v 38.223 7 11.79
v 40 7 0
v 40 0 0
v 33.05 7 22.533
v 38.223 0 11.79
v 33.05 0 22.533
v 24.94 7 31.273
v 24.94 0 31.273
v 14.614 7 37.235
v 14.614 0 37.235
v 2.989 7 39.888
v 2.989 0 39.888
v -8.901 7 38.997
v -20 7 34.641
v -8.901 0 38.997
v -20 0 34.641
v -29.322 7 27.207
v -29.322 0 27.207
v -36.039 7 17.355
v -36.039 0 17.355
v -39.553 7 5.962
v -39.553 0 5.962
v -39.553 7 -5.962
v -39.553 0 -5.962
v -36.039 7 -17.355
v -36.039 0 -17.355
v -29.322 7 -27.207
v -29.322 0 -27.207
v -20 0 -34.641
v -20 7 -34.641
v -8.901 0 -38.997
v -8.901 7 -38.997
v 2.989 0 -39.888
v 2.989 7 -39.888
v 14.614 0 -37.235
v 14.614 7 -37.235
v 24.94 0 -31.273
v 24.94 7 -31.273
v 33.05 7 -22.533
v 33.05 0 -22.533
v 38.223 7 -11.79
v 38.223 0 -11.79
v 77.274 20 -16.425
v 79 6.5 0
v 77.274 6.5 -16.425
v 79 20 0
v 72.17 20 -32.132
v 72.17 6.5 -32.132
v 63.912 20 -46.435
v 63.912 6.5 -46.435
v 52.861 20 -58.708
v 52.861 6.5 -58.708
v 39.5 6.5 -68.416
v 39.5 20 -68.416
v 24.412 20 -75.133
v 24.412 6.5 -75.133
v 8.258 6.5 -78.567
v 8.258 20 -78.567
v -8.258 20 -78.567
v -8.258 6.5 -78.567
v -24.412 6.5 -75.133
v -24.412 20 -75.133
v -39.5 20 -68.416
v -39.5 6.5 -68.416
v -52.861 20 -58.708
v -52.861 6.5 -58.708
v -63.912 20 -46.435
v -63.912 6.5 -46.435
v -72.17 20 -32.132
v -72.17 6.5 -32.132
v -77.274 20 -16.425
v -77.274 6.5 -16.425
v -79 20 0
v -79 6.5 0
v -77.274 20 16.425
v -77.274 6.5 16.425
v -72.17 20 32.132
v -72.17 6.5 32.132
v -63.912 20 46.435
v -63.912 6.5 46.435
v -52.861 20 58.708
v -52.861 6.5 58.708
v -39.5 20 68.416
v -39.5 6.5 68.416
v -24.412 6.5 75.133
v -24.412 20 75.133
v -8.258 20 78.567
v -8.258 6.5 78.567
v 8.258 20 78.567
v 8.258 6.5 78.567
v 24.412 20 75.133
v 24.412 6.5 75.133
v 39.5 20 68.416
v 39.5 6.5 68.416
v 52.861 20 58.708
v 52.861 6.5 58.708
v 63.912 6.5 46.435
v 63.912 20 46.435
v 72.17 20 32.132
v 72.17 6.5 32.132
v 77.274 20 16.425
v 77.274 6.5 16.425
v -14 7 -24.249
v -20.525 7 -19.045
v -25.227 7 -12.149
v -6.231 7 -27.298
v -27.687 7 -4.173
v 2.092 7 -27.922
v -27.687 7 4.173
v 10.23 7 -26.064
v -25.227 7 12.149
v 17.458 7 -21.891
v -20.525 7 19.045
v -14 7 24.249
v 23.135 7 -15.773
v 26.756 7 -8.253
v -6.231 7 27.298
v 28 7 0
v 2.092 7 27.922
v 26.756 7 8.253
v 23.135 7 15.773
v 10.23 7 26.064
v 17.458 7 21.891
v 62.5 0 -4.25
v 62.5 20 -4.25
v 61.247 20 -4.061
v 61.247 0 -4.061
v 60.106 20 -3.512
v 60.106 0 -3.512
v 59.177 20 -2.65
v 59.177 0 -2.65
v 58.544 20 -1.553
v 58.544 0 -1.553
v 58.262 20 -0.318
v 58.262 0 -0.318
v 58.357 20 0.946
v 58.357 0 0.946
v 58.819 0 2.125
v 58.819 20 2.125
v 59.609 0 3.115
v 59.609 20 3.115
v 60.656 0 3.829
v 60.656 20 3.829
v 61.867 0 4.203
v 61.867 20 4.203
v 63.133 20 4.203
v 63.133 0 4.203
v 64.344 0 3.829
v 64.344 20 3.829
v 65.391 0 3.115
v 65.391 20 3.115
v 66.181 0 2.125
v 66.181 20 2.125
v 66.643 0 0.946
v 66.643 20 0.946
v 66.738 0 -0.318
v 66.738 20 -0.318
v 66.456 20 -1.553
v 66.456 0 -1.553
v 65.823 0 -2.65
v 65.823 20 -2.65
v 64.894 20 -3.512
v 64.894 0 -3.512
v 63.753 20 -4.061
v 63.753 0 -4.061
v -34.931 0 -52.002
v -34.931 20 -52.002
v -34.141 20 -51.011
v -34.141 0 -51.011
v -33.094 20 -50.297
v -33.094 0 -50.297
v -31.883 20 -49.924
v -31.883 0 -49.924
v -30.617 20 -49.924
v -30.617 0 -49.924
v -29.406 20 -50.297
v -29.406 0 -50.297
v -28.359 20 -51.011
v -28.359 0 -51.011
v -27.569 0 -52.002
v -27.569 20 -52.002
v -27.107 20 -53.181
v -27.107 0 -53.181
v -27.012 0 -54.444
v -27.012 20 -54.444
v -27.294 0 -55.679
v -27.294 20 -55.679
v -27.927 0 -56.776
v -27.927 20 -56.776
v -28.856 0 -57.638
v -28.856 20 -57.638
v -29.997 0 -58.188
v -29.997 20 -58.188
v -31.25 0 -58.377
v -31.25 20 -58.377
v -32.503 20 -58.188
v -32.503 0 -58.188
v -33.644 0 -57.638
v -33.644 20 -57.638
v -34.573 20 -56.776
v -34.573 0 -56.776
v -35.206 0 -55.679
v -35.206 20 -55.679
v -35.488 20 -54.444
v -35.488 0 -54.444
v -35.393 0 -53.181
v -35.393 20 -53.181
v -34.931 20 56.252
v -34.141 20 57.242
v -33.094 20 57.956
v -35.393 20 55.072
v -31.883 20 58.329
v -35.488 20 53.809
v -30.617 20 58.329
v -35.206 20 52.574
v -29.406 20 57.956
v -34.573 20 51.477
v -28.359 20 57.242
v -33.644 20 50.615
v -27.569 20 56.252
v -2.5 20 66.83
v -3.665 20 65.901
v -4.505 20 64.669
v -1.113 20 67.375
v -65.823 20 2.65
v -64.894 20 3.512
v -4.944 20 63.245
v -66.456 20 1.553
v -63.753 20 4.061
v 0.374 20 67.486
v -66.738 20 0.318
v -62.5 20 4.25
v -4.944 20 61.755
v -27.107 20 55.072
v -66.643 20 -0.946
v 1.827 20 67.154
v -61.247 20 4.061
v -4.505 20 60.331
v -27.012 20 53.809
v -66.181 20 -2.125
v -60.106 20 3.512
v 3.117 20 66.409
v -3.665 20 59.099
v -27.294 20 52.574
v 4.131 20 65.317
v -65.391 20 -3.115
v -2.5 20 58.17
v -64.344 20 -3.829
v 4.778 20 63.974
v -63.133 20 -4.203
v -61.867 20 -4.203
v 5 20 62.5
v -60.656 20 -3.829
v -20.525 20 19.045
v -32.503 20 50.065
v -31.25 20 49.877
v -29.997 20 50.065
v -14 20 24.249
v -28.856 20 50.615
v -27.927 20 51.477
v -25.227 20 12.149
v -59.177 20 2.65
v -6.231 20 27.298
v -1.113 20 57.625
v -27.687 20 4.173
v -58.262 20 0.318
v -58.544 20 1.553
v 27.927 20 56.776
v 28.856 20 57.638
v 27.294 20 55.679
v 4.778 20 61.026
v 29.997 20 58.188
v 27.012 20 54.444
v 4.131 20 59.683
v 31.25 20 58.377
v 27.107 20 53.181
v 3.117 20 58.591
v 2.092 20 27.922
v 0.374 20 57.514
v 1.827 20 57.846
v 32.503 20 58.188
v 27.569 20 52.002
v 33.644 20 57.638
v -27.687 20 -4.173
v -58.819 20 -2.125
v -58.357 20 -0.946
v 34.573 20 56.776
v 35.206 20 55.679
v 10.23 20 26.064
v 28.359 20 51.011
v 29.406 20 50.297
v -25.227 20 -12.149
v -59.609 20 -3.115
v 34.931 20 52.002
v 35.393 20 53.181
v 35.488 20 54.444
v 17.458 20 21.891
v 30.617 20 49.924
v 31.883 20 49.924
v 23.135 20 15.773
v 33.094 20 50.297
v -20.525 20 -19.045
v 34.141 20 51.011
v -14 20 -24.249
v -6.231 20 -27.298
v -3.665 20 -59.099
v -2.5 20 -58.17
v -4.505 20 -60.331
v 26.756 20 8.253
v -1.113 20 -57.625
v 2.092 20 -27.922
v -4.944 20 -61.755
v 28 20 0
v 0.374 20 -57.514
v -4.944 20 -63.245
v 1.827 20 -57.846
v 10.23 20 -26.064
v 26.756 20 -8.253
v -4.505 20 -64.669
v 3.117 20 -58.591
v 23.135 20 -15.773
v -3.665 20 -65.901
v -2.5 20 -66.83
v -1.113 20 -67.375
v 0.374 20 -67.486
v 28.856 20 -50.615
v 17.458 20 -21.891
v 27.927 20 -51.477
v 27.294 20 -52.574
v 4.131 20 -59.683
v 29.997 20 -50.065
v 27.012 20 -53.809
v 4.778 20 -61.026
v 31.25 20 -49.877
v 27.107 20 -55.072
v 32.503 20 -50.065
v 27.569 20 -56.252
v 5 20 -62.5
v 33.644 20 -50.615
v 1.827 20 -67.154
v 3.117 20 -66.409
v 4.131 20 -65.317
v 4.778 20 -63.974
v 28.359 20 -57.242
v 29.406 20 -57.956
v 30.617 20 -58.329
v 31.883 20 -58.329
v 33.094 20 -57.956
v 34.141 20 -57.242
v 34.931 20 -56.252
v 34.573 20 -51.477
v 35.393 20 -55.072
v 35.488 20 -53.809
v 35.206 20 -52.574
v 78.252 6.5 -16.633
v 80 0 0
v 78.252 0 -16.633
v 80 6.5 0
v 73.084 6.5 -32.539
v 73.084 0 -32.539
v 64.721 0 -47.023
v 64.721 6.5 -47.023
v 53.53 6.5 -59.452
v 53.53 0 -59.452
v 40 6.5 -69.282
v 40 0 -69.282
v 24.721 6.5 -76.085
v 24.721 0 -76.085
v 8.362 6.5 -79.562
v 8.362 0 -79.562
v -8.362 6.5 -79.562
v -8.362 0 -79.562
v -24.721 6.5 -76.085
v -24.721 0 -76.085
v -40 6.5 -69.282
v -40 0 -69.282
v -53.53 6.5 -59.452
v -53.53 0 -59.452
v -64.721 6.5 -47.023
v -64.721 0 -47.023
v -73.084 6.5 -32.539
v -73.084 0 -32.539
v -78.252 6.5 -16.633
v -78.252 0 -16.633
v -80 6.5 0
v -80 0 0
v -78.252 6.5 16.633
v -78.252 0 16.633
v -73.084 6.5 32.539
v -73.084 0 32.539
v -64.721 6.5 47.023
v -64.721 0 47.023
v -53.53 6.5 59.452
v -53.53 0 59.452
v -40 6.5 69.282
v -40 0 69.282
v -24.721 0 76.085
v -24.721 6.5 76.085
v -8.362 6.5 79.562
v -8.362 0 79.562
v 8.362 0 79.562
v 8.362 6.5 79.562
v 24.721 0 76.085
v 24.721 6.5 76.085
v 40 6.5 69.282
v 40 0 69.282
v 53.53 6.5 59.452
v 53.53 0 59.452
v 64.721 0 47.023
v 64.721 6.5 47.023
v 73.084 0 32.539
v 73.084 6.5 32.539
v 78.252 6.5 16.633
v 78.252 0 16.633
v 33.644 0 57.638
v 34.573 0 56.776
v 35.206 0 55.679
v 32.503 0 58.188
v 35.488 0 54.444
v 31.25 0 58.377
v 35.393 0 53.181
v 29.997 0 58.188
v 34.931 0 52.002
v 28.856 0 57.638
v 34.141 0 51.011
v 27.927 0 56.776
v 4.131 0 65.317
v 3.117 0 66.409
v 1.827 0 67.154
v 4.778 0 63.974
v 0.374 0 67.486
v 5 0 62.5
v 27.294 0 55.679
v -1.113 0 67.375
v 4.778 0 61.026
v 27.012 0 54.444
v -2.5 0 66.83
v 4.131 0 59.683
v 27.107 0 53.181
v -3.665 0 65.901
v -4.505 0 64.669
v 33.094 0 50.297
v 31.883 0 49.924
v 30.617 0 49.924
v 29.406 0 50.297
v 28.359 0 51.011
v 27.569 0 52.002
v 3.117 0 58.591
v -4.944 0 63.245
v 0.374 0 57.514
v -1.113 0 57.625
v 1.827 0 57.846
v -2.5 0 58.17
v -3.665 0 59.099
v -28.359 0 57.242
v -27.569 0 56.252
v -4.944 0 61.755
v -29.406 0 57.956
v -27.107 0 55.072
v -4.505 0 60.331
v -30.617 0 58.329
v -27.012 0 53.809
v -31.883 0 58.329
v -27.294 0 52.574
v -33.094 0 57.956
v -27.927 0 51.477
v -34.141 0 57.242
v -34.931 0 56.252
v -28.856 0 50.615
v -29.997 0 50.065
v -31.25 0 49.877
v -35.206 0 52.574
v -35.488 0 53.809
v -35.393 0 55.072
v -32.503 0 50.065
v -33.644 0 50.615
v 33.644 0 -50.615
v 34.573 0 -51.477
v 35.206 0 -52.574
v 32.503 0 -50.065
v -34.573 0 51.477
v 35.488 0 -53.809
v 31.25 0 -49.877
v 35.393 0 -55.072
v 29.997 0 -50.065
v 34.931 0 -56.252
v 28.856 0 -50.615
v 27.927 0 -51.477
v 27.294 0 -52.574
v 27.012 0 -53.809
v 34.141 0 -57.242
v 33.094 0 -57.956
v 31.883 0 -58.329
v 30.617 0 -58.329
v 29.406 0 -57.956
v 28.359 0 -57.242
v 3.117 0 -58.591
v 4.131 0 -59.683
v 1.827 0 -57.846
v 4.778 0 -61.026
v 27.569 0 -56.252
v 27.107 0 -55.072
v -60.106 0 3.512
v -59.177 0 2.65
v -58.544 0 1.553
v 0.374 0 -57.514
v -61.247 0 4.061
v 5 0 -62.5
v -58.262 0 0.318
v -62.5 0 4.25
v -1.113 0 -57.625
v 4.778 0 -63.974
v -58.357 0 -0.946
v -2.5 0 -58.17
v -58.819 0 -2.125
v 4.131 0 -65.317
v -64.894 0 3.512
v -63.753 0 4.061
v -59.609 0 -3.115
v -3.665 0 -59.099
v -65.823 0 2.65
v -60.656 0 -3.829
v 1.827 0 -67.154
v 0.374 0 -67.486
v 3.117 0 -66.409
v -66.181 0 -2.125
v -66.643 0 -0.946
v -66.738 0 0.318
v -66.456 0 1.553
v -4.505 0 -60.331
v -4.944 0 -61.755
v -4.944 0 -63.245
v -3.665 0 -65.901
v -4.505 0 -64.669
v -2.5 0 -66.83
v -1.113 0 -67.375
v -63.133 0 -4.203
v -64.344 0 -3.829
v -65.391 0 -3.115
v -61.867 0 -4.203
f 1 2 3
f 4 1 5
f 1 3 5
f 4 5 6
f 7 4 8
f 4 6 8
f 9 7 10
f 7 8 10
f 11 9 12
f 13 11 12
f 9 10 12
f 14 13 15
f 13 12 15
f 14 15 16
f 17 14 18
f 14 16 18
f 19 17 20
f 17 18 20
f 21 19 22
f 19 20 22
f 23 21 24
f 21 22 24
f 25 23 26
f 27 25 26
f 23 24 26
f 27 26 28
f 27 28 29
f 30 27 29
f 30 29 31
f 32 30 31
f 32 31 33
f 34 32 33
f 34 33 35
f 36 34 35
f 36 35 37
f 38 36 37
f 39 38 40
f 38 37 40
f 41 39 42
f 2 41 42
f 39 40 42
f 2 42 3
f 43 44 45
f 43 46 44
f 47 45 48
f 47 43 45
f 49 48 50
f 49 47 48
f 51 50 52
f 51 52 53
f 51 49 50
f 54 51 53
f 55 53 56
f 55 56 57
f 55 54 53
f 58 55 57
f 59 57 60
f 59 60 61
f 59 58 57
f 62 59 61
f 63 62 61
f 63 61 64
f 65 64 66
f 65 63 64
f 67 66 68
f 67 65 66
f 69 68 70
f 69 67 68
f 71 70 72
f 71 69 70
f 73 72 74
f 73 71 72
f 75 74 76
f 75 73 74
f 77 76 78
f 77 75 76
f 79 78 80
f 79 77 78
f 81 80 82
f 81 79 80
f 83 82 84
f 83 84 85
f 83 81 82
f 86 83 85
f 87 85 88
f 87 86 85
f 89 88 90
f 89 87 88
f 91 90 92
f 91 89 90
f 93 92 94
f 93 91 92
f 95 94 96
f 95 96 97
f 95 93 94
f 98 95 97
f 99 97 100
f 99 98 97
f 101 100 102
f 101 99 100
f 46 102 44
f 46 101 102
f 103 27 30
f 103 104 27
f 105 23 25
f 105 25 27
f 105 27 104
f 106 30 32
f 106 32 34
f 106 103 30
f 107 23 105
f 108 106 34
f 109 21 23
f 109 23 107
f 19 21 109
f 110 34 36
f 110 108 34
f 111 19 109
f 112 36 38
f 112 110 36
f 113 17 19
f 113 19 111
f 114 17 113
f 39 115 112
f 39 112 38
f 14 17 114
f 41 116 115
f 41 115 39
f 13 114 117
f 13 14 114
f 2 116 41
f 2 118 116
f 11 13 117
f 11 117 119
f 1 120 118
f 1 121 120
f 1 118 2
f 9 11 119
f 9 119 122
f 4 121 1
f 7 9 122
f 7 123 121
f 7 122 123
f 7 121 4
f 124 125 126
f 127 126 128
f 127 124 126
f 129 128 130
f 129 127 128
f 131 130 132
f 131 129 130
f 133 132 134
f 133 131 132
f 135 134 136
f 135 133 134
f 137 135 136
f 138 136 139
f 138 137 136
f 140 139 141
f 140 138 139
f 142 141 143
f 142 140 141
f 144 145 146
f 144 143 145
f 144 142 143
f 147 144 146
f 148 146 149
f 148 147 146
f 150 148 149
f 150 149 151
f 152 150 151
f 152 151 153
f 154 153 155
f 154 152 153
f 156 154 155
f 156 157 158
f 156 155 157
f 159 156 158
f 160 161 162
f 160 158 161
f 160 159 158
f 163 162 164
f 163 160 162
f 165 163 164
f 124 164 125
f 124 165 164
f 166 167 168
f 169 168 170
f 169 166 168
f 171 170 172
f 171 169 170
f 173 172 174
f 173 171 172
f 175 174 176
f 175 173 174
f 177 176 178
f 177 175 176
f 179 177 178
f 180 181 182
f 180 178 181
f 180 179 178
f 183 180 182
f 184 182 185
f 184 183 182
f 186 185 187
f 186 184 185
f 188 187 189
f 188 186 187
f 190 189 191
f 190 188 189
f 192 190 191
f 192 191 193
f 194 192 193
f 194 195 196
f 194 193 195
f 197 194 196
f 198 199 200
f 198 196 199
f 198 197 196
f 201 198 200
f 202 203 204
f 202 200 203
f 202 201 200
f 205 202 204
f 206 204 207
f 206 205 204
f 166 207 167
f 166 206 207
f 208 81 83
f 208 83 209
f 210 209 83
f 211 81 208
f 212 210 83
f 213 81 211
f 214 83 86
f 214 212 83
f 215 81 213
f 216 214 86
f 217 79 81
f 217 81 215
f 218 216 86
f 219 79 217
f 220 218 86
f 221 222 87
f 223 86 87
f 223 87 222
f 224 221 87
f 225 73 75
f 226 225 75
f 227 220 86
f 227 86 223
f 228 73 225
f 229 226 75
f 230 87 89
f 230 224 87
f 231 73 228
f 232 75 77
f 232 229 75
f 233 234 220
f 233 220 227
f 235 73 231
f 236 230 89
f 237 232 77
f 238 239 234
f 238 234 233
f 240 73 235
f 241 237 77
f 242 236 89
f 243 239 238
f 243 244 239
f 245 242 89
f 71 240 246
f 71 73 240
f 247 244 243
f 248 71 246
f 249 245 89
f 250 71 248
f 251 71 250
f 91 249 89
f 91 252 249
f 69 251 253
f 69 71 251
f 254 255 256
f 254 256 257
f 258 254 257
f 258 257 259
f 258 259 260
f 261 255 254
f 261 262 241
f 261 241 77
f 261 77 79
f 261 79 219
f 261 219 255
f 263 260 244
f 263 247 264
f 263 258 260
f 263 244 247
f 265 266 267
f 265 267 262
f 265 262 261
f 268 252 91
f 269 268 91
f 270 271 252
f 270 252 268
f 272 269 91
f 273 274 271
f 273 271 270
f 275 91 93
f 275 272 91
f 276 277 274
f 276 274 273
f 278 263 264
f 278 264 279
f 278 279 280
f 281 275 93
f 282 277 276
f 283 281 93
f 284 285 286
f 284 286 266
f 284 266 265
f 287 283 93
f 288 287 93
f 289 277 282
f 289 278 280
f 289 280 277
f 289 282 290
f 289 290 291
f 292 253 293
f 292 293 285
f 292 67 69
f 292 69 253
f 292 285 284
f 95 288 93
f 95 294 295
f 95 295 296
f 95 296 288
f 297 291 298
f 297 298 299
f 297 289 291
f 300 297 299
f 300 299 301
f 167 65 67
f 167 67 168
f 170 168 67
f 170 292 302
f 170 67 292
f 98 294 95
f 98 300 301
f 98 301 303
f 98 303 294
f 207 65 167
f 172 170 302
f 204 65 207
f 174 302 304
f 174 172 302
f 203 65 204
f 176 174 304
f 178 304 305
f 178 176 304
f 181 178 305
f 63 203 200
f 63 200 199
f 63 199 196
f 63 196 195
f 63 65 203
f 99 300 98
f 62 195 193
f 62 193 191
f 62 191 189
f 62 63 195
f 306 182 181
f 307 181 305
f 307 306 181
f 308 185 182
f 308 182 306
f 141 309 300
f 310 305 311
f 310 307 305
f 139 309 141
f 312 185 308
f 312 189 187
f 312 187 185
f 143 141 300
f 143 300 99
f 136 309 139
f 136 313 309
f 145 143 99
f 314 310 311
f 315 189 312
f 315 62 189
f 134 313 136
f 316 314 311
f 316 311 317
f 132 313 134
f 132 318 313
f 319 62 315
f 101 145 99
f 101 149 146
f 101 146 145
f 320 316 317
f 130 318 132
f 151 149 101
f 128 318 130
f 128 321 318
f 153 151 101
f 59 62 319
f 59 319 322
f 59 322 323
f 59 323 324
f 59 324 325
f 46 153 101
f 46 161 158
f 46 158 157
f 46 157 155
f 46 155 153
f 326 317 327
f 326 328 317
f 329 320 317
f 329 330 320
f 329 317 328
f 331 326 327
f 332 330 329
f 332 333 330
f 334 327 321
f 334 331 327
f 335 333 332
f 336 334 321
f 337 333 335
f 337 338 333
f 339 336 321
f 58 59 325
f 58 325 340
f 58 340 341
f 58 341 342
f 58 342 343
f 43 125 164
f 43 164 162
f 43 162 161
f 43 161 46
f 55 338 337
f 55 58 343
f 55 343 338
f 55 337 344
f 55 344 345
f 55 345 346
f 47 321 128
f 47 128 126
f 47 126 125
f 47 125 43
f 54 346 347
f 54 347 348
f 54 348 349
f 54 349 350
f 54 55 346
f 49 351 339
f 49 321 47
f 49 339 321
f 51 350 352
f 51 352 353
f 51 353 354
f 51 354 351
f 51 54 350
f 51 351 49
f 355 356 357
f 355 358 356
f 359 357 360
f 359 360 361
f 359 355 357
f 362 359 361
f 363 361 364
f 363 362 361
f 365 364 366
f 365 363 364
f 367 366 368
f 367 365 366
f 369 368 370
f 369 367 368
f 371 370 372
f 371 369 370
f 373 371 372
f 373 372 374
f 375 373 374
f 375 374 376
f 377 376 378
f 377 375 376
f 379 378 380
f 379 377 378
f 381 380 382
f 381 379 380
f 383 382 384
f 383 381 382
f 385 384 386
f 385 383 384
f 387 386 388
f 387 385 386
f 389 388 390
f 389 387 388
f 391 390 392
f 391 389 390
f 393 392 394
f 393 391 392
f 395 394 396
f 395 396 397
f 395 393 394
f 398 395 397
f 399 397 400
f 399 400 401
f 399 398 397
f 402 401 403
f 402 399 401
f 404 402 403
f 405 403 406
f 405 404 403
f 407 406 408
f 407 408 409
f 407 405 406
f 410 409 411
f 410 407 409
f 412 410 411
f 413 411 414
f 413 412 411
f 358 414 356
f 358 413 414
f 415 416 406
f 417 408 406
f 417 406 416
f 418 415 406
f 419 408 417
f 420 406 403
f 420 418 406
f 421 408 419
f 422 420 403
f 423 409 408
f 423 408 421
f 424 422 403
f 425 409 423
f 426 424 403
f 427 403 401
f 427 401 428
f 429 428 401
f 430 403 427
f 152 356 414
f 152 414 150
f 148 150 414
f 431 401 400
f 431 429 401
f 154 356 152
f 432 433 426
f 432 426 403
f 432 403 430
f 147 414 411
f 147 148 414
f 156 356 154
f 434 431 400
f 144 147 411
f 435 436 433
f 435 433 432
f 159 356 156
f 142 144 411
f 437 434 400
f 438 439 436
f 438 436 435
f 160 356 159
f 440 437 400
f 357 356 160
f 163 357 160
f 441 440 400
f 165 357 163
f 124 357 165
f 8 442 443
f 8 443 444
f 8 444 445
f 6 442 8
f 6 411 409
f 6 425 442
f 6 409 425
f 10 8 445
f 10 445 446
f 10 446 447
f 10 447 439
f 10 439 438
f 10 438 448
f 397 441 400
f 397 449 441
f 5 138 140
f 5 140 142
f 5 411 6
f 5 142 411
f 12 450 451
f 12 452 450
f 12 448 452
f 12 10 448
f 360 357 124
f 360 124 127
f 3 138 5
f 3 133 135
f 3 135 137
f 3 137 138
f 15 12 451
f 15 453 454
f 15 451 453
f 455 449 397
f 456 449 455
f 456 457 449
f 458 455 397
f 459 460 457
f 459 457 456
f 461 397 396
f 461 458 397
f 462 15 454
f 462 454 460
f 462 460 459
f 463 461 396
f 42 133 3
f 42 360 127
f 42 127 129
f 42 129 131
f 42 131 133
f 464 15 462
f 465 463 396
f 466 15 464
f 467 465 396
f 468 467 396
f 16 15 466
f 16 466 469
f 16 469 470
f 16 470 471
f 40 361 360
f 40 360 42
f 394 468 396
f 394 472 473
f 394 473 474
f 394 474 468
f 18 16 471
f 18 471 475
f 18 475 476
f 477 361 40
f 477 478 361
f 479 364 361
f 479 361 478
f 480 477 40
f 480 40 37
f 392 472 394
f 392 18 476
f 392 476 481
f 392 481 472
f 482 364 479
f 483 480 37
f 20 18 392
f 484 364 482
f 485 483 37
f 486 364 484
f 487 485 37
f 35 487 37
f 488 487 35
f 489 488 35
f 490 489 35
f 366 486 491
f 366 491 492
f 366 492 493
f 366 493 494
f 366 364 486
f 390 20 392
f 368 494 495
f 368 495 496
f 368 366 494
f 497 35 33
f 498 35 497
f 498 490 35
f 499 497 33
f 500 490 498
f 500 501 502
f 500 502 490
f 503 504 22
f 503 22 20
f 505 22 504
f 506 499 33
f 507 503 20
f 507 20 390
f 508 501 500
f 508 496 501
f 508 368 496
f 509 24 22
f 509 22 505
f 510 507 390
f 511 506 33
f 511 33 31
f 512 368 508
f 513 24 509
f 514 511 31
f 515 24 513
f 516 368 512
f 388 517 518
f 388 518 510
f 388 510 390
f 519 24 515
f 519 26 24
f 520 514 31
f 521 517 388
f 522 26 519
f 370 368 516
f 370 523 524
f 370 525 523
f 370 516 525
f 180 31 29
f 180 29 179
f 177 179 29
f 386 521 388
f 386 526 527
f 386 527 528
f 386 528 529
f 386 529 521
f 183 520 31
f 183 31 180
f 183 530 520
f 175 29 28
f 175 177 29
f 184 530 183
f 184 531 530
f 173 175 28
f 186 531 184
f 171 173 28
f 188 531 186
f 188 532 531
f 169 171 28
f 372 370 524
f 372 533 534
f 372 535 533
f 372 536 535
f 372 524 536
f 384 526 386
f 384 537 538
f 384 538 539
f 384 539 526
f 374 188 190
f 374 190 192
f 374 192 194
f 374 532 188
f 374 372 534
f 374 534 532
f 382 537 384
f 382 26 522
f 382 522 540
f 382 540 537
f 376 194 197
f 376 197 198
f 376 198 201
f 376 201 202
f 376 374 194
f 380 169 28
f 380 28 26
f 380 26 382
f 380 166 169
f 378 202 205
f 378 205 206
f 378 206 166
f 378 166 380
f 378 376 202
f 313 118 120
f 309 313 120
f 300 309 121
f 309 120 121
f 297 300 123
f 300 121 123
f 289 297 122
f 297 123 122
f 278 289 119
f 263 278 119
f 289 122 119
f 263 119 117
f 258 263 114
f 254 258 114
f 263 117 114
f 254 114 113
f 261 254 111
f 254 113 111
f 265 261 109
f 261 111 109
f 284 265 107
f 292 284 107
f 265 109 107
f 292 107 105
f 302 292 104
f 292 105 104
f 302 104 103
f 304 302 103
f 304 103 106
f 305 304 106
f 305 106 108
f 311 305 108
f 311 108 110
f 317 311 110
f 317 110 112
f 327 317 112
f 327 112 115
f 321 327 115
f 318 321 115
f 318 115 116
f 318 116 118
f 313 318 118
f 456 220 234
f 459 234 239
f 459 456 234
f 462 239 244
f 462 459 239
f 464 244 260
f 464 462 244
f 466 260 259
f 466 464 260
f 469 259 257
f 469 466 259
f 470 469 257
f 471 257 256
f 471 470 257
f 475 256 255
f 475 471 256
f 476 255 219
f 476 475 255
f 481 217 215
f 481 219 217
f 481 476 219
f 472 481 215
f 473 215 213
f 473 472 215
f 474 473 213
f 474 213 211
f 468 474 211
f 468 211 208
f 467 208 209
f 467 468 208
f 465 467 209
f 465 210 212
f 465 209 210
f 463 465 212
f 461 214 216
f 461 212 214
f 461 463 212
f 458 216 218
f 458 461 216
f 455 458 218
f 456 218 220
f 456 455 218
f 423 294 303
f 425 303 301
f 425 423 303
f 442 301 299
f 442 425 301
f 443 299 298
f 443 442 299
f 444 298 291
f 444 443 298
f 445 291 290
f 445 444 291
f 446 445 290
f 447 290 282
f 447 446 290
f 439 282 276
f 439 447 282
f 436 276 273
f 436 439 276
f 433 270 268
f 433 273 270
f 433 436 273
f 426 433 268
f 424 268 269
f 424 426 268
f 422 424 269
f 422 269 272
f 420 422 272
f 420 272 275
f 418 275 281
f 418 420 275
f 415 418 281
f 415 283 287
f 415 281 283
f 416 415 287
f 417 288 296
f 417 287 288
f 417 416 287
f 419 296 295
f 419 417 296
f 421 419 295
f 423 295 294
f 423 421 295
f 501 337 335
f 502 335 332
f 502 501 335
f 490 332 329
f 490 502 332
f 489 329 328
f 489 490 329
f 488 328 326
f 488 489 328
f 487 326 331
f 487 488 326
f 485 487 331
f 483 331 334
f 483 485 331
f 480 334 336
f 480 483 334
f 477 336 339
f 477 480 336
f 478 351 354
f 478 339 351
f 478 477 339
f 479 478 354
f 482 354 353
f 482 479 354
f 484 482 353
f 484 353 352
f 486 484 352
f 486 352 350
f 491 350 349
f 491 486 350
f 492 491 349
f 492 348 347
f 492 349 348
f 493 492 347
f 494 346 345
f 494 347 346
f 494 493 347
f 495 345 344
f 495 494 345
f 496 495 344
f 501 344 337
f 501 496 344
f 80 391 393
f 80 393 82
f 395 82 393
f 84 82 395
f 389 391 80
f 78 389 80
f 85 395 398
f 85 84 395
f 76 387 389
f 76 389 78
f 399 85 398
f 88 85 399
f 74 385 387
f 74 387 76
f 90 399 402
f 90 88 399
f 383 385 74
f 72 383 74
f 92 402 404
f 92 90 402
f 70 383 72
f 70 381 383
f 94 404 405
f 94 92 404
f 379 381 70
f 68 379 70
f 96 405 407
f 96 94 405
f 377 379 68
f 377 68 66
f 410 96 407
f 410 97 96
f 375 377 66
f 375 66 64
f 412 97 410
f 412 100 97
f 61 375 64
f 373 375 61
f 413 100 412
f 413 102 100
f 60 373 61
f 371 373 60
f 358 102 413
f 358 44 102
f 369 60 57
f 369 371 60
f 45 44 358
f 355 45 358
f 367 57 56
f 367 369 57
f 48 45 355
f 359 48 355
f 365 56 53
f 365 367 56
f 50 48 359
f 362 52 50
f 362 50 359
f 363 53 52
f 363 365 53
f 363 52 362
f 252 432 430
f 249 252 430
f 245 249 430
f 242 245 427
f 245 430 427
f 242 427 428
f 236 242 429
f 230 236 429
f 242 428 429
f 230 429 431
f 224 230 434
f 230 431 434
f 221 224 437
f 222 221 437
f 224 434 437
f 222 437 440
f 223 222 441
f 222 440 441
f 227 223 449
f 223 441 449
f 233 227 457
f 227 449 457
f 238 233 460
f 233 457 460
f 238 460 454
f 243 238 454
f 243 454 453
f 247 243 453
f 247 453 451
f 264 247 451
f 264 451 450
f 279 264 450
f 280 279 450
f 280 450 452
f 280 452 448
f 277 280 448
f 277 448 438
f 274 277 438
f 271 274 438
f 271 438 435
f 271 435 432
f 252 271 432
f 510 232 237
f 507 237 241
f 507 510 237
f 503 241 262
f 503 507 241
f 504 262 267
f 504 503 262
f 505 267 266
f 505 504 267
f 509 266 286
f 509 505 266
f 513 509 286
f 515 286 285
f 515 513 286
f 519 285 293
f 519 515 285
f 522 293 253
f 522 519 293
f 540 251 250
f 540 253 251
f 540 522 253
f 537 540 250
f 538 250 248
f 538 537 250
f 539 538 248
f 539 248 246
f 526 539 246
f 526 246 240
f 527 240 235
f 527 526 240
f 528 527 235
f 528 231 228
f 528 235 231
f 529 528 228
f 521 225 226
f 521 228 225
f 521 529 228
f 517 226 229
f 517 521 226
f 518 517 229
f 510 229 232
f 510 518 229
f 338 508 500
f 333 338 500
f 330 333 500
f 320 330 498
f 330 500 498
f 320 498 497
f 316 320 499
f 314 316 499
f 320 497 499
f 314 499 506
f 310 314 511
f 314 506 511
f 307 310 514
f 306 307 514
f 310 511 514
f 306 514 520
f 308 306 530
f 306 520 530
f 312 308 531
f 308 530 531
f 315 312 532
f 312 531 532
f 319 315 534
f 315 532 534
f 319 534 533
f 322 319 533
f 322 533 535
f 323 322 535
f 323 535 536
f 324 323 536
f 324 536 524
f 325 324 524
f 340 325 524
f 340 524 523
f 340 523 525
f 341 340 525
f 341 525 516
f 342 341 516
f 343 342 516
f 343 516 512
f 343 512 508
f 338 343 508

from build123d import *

# Parameters (mm, degrees)
SCHIZZO2_R                  = 28
TAGLIO_ESTRUSIONE1_DEPTH    = 21
RIPETIZIONECIRCOLARE1_COUNT = 6
SCHIZZO5_R                  = 5
TAGLIO_ESTRUSIONE2_DEPTH    = 21
SCHIZZO6_R                  = 40
TAGLIO_ESTRUSIONE3_DEPTH    = 7


with BuildPart() as part:
    # Schizzo1 → Rivoluzione1 (revolve)
    with BuildSketch(Plane.XY):
        Polygon((0, 0), (80, 0), (80, 6.5), (79, 6.5), (79, 20), (0, 20), align=None)
    revolve(axis=Axis((0, 0, 0), (0, 1, 0)))

    # Schizzo2 → Taglio-Estrusione1 (cut, through all)
    with BuildSketch(Plane.XZ):
        Circle(SCHIZZO2_R)
    extrude(amount=-TAGLIO_ESTRUSIONE1_DEPTH, mode=Mode.SUBTRACT)

    # Schizzo3 → M10 Foro filettato profondo1 (revolve, cut)
    with BuildSketch(Plane(origin=(62.5, 0, 0), x_dir=(0, 0, -1), z_dir=(1, 0, 0))):
        Polygon((0, 0), (0, 27.553657631), (4.25, 25), (4.25, 0), align=None)
    m10_foro_filettato_profondo1 = revolve(axis=Axis((62.5, -6.35, 0), (0, 1, 0)), mode=Mode.SUBTRACT)

    # RipetizioneCircolare1: M10 Foro filettato profondo1 ×6 about axis
    ripetizionecircolare1_axis = Axis((0, 0, 0), (0, 1, 0))
    for i in range(1, RIPETIZIONECIRCOLARE1_COUNT):
        add(m10_foro_filettato_profondo1.rotate(ripetizionecircolare1_axis, i * 360 / RIPETIZIONECIRCOLARE1_COUNT), mode=Mode.SUBTRACT)

    # Schizzo5 → Taglio-Estrusione2 (cut, through all)
    with BuildSketch(Plane.XZ):
        with Locations((0, 62.5)):
            Circle(SCHIZZO5_R)
        with Locations((0, -62.5)):
            Circle(SCHIZZO5_R)
    extrude(amount=-TAGLIO_ESTRUSIONE2_DEPTH, mode=Mode.SUBTRACT)

    # Schizzo6 → Taglio-Estrusione3 (cut)
    with BuildSketch(Plane.XZ):
        Circle(SCHIZZO6_R)
    extrude(amount=-TAGLIO_ESTRUSIONE3_DEPTH, mode=Mode.SUBTRACT)


solid = part.part
